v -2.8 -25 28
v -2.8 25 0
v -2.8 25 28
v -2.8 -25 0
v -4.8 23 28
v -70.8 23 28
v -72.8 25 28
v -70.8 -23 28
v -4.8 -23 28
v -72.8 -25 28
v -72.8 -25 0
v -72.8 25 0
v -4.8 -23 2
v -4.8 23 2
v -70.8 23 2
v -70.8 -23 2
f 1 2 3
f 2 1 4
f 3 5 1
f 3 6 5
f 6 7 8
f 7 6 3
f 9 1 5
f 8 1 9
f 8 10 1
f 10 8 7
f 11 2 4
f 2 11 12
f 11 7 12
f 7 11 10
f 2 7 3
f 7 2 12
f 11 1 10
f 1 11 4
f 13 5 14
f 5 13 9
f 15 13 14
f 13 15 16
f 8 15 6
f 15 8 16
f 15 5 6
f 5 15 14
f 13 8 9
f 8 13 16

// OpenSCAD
// Two-part enclosure for small electronics board
// Part 1: Box (left)
// Part 2: Lid (right, printed upside down)
// Prints together with a 10mm gap.

$fn = 64;

// --- Dimensions ---

// Part 1: Box
// Outer size X x Y x Z
BOX_OUT_X = 70;
BOX_OUT_Y = 50;
BOX_OUT_Z = 30;
// Wall and floor thickness
BOX_WALL_THICK = 2;
BOX_FLOOR_THICK = 2;

// Part 2: Lid
// Base plate thickness
LID_PLATE_THICK = 2;
// Lip dimensions
LIP_WALL_THICK = 1.5;
LIP_HEIGHT = 4;
// Lip outer size (fits inside box opening)
LIP_OUT_X = 65.6;
LIP_OUT_Y = 45.6;
// Clearance per side (calculated from outer size vs box inner size)
// Box inner X = 70 - 2*2 = 66. Lip outer X = 65.6. Clearance = (66-65.6)/2 = 0.2
CLEARANCE_X = 0.2;
// Clearance Y = (50 - 2*2 - 45.6)/2 = (46 - 45.6)/2 = 0.2
CLEARANCE_Y = 0.2;

// --- Positioning ---
// Gap between parts
PART_GAP = 10;

// Center the whole assembly on the bed (X=0)
// Total width = BOX_OUT_X + PART_GAP + LIP_OUT_X
TOTAL_WIDTH = BOX_OUT_X + PART_GAP + LIP_OUT_X;
ORIGIN_X = -TOTAL_WIDTH / 2;

// Center Y
ORIGIN_Y = -BOX_OUT_Y / 2;

// Z starts at 0
ORIGIN_Z = 0;

// --- Helper Functions ---

// Create the Box (Part 1)
module box() {
    translate([ORIGIN_X, ORIGIN_Y, ORIGIN_Z]) {
        // Calculate inner dimensions
        INNER_X = BOX_OUT_X - 2 * BOX_WALL_THICK;
        INNER_Y = BOX_OUT_Y - 2 * BOX_WALL_THICK;
        INNER_Z = BOX_OUT_Z - BOX_FLOOR_THICK; // Open top
        
        // Build from bottom up
        // 1. Floor
        cube([BOX_OUT_X, BOX_OUT_Y, BOX_FLOOR_THICK], center=false);
        
        // 2. Walls (using difference to cut out the hole)
        // We create a solid block of walls and subtract the inner volume
        // Wall block dimensions:
        // X: BOX_OUT_X
        // Y: BOX_OUT_Y
        // Z: BOX_OUT_Z - BOX_FLOOR_THICK (height of walls)
        
        difference() {
            // Solid block representing the walls
            cube([BOX_OUT_X, BOX_OUT_Y, BOX_OUT_Z - BOX_FLOOR_THICK], center=false);
            
            // Cut out the inner empty space
            translate([BOX_WALL_THICK, BOX_WALL_THICK, BOX_FLOOR_THICK]) {
                cube([INNER_X, INNER_Y, INNER_Z], center=false);
            }
        }
    }
}

// Create the Lid (Part 2)
// The lid is printed upside down relative to the box opening.
// The plate lies on the bed. The lip sticks UP from the plate.
// However, the prompt says "printed upside down: a plate ... with a rectangular lip on top of it".
// This implies the lip is the part that goes INTO the box.
// If the plate is on the bed, and the lip is "on top", the lip points +Z.
// The box has an open top at +Z.
// So the lid sits on the bed, lip points up, and slides into the box.
// Wait, if the lid is printed upside down, usually that means the "top" of the part (the lip) is facing the bed?
// Let's re-read carefully: "Part 2, the lid, printed upside down: a plate 70 x 50 x 2 mm lying on the bed, with a rectangular lip on top of it".
// This phrasing is slightly ambiguous. 
// Interpretation A: The physical part has a plate and a lip. When printed, the plate is on the bed, lip points up. This is the "normal" orientation for a lid that sits on top of a box.
// Interpretation B: "Printed upside down" means the part is flipped. If the part is designed with the lip on the "top" face, printing it upside down puts the lip on the bed.
// BUT the description says: "a plate ... lying on the bed, with a rectangular lip on top of it".
// This explicitly states the plate is on the bed and the lip is on top of the plate (pointing +Z).
// So the "printed upside down" might refer to the design intent (it's a lid, usually placed on top, but here we print it flat on the bed).
// Let's stick to the explicit geometric description: Plate on bed, Lip pointing +Z.
// The lip outer size is 65.6 x 45.6.
// The box inner size is 66 x 46.
// Clearance is 0.2 on each side.
// The lip slides into the box.

module lid() {
    translate([ORIGIN_X + BOX_OUT_X + PART_GAP, ORIGIN_Y, ORIGIN_Z]) {
        // Base Plate
        cube([BOX_OUT_X, BOX_OUT_Y, LID_PLATE_THICK], center=false);
        
        // Lip
        // The lip sits ON TOP of the plate.
        // Lip outer dimensions: LIP_OUT_X x LIP_OUT_Y
        // Lip wall thickness: LIP_WALL_THICK
        // Lip height: LIP_HEIGHT
        
        // We construct the lip as a solid block and subtract the inner hole.
        // Lip block size: LIP_OUT_X x LIP_OUT_Y x (LIP_HEIGHT + LID_PLATE_THICK)
        // Wait, the lip is a wall. It has thickness.
        // The lip sits on the plate.
        // The lip's outer footprint is LIP_OUT_X x LIP_OUT_Y.
        // The lip's inner hole is (LIP_OUT_X - 2*LIP_WALL_THICK) x (LIP_OUT_Y - 2*LIP_WALL_THICK).
        // The lip height is LIP_HEIGHT.
        
        // Let's build the lip as a hollow box sitting on the plate.
        
        // 1. Solid block for the lip walls + plate connection
        // Dimensions: LIP_OUT_X x LIP_OUT_Y x (LIP_HEIGHT + LID_PLATE_THICK)
        lip_block_h = LIP_HEIGHT + LID_PLATE_THICK;
        
        // We need to be careful with the "on top" part.
        // The plate is already printed.
        // Now we add the lip structure.
        
        // Lip Outer Box (Solid)
        translate([0, 0, LID_PLATE_THICK]) {
            cube([LIP_OUT_X, LIP_OUT_Y, LIP_HEIGHT], center=false);
        }
        
        // Lip Inner Hole (Cutout)
        // The hole goes through the lip walls.
        // It starts at the top of the lip (Z = LID_PLATE_THICK + LIP_HEIGHT)
        // and goes down to the top of the plate (Z = LID_PLATE_THICK).
        // Actually, usually the hole goes all the way through the lip walls.
        // Does it go into the plate? No, the plate is solid.
        // So the hole is a cylinder/box of height LIP_HEIGHT.
        
        translate([LIP_WALL_THICK, LIP_WALL_THICK, LID_PLATE_THICK]) {
            cube([LIP_OUT_X - 2*LIP_WALL_THICK, LIP_OUT_Y - 2*LIP_WALL_THICK, LIP_HEIGHT], center=false);
        }
    }
}

// --- Main Assembly ---

difference() {
    // We use difference just to ensure clean separation if we were merging, 
    // but since we are placing them side-by-side with a gap, union is safer to avoid artifacts.
    // However, the prompt asks for "two-part enclosure... so they print together".
    // We just place them.
    
    // Part 1: Box
    box();
    
    // Part 2: Lid
    lid();
}
